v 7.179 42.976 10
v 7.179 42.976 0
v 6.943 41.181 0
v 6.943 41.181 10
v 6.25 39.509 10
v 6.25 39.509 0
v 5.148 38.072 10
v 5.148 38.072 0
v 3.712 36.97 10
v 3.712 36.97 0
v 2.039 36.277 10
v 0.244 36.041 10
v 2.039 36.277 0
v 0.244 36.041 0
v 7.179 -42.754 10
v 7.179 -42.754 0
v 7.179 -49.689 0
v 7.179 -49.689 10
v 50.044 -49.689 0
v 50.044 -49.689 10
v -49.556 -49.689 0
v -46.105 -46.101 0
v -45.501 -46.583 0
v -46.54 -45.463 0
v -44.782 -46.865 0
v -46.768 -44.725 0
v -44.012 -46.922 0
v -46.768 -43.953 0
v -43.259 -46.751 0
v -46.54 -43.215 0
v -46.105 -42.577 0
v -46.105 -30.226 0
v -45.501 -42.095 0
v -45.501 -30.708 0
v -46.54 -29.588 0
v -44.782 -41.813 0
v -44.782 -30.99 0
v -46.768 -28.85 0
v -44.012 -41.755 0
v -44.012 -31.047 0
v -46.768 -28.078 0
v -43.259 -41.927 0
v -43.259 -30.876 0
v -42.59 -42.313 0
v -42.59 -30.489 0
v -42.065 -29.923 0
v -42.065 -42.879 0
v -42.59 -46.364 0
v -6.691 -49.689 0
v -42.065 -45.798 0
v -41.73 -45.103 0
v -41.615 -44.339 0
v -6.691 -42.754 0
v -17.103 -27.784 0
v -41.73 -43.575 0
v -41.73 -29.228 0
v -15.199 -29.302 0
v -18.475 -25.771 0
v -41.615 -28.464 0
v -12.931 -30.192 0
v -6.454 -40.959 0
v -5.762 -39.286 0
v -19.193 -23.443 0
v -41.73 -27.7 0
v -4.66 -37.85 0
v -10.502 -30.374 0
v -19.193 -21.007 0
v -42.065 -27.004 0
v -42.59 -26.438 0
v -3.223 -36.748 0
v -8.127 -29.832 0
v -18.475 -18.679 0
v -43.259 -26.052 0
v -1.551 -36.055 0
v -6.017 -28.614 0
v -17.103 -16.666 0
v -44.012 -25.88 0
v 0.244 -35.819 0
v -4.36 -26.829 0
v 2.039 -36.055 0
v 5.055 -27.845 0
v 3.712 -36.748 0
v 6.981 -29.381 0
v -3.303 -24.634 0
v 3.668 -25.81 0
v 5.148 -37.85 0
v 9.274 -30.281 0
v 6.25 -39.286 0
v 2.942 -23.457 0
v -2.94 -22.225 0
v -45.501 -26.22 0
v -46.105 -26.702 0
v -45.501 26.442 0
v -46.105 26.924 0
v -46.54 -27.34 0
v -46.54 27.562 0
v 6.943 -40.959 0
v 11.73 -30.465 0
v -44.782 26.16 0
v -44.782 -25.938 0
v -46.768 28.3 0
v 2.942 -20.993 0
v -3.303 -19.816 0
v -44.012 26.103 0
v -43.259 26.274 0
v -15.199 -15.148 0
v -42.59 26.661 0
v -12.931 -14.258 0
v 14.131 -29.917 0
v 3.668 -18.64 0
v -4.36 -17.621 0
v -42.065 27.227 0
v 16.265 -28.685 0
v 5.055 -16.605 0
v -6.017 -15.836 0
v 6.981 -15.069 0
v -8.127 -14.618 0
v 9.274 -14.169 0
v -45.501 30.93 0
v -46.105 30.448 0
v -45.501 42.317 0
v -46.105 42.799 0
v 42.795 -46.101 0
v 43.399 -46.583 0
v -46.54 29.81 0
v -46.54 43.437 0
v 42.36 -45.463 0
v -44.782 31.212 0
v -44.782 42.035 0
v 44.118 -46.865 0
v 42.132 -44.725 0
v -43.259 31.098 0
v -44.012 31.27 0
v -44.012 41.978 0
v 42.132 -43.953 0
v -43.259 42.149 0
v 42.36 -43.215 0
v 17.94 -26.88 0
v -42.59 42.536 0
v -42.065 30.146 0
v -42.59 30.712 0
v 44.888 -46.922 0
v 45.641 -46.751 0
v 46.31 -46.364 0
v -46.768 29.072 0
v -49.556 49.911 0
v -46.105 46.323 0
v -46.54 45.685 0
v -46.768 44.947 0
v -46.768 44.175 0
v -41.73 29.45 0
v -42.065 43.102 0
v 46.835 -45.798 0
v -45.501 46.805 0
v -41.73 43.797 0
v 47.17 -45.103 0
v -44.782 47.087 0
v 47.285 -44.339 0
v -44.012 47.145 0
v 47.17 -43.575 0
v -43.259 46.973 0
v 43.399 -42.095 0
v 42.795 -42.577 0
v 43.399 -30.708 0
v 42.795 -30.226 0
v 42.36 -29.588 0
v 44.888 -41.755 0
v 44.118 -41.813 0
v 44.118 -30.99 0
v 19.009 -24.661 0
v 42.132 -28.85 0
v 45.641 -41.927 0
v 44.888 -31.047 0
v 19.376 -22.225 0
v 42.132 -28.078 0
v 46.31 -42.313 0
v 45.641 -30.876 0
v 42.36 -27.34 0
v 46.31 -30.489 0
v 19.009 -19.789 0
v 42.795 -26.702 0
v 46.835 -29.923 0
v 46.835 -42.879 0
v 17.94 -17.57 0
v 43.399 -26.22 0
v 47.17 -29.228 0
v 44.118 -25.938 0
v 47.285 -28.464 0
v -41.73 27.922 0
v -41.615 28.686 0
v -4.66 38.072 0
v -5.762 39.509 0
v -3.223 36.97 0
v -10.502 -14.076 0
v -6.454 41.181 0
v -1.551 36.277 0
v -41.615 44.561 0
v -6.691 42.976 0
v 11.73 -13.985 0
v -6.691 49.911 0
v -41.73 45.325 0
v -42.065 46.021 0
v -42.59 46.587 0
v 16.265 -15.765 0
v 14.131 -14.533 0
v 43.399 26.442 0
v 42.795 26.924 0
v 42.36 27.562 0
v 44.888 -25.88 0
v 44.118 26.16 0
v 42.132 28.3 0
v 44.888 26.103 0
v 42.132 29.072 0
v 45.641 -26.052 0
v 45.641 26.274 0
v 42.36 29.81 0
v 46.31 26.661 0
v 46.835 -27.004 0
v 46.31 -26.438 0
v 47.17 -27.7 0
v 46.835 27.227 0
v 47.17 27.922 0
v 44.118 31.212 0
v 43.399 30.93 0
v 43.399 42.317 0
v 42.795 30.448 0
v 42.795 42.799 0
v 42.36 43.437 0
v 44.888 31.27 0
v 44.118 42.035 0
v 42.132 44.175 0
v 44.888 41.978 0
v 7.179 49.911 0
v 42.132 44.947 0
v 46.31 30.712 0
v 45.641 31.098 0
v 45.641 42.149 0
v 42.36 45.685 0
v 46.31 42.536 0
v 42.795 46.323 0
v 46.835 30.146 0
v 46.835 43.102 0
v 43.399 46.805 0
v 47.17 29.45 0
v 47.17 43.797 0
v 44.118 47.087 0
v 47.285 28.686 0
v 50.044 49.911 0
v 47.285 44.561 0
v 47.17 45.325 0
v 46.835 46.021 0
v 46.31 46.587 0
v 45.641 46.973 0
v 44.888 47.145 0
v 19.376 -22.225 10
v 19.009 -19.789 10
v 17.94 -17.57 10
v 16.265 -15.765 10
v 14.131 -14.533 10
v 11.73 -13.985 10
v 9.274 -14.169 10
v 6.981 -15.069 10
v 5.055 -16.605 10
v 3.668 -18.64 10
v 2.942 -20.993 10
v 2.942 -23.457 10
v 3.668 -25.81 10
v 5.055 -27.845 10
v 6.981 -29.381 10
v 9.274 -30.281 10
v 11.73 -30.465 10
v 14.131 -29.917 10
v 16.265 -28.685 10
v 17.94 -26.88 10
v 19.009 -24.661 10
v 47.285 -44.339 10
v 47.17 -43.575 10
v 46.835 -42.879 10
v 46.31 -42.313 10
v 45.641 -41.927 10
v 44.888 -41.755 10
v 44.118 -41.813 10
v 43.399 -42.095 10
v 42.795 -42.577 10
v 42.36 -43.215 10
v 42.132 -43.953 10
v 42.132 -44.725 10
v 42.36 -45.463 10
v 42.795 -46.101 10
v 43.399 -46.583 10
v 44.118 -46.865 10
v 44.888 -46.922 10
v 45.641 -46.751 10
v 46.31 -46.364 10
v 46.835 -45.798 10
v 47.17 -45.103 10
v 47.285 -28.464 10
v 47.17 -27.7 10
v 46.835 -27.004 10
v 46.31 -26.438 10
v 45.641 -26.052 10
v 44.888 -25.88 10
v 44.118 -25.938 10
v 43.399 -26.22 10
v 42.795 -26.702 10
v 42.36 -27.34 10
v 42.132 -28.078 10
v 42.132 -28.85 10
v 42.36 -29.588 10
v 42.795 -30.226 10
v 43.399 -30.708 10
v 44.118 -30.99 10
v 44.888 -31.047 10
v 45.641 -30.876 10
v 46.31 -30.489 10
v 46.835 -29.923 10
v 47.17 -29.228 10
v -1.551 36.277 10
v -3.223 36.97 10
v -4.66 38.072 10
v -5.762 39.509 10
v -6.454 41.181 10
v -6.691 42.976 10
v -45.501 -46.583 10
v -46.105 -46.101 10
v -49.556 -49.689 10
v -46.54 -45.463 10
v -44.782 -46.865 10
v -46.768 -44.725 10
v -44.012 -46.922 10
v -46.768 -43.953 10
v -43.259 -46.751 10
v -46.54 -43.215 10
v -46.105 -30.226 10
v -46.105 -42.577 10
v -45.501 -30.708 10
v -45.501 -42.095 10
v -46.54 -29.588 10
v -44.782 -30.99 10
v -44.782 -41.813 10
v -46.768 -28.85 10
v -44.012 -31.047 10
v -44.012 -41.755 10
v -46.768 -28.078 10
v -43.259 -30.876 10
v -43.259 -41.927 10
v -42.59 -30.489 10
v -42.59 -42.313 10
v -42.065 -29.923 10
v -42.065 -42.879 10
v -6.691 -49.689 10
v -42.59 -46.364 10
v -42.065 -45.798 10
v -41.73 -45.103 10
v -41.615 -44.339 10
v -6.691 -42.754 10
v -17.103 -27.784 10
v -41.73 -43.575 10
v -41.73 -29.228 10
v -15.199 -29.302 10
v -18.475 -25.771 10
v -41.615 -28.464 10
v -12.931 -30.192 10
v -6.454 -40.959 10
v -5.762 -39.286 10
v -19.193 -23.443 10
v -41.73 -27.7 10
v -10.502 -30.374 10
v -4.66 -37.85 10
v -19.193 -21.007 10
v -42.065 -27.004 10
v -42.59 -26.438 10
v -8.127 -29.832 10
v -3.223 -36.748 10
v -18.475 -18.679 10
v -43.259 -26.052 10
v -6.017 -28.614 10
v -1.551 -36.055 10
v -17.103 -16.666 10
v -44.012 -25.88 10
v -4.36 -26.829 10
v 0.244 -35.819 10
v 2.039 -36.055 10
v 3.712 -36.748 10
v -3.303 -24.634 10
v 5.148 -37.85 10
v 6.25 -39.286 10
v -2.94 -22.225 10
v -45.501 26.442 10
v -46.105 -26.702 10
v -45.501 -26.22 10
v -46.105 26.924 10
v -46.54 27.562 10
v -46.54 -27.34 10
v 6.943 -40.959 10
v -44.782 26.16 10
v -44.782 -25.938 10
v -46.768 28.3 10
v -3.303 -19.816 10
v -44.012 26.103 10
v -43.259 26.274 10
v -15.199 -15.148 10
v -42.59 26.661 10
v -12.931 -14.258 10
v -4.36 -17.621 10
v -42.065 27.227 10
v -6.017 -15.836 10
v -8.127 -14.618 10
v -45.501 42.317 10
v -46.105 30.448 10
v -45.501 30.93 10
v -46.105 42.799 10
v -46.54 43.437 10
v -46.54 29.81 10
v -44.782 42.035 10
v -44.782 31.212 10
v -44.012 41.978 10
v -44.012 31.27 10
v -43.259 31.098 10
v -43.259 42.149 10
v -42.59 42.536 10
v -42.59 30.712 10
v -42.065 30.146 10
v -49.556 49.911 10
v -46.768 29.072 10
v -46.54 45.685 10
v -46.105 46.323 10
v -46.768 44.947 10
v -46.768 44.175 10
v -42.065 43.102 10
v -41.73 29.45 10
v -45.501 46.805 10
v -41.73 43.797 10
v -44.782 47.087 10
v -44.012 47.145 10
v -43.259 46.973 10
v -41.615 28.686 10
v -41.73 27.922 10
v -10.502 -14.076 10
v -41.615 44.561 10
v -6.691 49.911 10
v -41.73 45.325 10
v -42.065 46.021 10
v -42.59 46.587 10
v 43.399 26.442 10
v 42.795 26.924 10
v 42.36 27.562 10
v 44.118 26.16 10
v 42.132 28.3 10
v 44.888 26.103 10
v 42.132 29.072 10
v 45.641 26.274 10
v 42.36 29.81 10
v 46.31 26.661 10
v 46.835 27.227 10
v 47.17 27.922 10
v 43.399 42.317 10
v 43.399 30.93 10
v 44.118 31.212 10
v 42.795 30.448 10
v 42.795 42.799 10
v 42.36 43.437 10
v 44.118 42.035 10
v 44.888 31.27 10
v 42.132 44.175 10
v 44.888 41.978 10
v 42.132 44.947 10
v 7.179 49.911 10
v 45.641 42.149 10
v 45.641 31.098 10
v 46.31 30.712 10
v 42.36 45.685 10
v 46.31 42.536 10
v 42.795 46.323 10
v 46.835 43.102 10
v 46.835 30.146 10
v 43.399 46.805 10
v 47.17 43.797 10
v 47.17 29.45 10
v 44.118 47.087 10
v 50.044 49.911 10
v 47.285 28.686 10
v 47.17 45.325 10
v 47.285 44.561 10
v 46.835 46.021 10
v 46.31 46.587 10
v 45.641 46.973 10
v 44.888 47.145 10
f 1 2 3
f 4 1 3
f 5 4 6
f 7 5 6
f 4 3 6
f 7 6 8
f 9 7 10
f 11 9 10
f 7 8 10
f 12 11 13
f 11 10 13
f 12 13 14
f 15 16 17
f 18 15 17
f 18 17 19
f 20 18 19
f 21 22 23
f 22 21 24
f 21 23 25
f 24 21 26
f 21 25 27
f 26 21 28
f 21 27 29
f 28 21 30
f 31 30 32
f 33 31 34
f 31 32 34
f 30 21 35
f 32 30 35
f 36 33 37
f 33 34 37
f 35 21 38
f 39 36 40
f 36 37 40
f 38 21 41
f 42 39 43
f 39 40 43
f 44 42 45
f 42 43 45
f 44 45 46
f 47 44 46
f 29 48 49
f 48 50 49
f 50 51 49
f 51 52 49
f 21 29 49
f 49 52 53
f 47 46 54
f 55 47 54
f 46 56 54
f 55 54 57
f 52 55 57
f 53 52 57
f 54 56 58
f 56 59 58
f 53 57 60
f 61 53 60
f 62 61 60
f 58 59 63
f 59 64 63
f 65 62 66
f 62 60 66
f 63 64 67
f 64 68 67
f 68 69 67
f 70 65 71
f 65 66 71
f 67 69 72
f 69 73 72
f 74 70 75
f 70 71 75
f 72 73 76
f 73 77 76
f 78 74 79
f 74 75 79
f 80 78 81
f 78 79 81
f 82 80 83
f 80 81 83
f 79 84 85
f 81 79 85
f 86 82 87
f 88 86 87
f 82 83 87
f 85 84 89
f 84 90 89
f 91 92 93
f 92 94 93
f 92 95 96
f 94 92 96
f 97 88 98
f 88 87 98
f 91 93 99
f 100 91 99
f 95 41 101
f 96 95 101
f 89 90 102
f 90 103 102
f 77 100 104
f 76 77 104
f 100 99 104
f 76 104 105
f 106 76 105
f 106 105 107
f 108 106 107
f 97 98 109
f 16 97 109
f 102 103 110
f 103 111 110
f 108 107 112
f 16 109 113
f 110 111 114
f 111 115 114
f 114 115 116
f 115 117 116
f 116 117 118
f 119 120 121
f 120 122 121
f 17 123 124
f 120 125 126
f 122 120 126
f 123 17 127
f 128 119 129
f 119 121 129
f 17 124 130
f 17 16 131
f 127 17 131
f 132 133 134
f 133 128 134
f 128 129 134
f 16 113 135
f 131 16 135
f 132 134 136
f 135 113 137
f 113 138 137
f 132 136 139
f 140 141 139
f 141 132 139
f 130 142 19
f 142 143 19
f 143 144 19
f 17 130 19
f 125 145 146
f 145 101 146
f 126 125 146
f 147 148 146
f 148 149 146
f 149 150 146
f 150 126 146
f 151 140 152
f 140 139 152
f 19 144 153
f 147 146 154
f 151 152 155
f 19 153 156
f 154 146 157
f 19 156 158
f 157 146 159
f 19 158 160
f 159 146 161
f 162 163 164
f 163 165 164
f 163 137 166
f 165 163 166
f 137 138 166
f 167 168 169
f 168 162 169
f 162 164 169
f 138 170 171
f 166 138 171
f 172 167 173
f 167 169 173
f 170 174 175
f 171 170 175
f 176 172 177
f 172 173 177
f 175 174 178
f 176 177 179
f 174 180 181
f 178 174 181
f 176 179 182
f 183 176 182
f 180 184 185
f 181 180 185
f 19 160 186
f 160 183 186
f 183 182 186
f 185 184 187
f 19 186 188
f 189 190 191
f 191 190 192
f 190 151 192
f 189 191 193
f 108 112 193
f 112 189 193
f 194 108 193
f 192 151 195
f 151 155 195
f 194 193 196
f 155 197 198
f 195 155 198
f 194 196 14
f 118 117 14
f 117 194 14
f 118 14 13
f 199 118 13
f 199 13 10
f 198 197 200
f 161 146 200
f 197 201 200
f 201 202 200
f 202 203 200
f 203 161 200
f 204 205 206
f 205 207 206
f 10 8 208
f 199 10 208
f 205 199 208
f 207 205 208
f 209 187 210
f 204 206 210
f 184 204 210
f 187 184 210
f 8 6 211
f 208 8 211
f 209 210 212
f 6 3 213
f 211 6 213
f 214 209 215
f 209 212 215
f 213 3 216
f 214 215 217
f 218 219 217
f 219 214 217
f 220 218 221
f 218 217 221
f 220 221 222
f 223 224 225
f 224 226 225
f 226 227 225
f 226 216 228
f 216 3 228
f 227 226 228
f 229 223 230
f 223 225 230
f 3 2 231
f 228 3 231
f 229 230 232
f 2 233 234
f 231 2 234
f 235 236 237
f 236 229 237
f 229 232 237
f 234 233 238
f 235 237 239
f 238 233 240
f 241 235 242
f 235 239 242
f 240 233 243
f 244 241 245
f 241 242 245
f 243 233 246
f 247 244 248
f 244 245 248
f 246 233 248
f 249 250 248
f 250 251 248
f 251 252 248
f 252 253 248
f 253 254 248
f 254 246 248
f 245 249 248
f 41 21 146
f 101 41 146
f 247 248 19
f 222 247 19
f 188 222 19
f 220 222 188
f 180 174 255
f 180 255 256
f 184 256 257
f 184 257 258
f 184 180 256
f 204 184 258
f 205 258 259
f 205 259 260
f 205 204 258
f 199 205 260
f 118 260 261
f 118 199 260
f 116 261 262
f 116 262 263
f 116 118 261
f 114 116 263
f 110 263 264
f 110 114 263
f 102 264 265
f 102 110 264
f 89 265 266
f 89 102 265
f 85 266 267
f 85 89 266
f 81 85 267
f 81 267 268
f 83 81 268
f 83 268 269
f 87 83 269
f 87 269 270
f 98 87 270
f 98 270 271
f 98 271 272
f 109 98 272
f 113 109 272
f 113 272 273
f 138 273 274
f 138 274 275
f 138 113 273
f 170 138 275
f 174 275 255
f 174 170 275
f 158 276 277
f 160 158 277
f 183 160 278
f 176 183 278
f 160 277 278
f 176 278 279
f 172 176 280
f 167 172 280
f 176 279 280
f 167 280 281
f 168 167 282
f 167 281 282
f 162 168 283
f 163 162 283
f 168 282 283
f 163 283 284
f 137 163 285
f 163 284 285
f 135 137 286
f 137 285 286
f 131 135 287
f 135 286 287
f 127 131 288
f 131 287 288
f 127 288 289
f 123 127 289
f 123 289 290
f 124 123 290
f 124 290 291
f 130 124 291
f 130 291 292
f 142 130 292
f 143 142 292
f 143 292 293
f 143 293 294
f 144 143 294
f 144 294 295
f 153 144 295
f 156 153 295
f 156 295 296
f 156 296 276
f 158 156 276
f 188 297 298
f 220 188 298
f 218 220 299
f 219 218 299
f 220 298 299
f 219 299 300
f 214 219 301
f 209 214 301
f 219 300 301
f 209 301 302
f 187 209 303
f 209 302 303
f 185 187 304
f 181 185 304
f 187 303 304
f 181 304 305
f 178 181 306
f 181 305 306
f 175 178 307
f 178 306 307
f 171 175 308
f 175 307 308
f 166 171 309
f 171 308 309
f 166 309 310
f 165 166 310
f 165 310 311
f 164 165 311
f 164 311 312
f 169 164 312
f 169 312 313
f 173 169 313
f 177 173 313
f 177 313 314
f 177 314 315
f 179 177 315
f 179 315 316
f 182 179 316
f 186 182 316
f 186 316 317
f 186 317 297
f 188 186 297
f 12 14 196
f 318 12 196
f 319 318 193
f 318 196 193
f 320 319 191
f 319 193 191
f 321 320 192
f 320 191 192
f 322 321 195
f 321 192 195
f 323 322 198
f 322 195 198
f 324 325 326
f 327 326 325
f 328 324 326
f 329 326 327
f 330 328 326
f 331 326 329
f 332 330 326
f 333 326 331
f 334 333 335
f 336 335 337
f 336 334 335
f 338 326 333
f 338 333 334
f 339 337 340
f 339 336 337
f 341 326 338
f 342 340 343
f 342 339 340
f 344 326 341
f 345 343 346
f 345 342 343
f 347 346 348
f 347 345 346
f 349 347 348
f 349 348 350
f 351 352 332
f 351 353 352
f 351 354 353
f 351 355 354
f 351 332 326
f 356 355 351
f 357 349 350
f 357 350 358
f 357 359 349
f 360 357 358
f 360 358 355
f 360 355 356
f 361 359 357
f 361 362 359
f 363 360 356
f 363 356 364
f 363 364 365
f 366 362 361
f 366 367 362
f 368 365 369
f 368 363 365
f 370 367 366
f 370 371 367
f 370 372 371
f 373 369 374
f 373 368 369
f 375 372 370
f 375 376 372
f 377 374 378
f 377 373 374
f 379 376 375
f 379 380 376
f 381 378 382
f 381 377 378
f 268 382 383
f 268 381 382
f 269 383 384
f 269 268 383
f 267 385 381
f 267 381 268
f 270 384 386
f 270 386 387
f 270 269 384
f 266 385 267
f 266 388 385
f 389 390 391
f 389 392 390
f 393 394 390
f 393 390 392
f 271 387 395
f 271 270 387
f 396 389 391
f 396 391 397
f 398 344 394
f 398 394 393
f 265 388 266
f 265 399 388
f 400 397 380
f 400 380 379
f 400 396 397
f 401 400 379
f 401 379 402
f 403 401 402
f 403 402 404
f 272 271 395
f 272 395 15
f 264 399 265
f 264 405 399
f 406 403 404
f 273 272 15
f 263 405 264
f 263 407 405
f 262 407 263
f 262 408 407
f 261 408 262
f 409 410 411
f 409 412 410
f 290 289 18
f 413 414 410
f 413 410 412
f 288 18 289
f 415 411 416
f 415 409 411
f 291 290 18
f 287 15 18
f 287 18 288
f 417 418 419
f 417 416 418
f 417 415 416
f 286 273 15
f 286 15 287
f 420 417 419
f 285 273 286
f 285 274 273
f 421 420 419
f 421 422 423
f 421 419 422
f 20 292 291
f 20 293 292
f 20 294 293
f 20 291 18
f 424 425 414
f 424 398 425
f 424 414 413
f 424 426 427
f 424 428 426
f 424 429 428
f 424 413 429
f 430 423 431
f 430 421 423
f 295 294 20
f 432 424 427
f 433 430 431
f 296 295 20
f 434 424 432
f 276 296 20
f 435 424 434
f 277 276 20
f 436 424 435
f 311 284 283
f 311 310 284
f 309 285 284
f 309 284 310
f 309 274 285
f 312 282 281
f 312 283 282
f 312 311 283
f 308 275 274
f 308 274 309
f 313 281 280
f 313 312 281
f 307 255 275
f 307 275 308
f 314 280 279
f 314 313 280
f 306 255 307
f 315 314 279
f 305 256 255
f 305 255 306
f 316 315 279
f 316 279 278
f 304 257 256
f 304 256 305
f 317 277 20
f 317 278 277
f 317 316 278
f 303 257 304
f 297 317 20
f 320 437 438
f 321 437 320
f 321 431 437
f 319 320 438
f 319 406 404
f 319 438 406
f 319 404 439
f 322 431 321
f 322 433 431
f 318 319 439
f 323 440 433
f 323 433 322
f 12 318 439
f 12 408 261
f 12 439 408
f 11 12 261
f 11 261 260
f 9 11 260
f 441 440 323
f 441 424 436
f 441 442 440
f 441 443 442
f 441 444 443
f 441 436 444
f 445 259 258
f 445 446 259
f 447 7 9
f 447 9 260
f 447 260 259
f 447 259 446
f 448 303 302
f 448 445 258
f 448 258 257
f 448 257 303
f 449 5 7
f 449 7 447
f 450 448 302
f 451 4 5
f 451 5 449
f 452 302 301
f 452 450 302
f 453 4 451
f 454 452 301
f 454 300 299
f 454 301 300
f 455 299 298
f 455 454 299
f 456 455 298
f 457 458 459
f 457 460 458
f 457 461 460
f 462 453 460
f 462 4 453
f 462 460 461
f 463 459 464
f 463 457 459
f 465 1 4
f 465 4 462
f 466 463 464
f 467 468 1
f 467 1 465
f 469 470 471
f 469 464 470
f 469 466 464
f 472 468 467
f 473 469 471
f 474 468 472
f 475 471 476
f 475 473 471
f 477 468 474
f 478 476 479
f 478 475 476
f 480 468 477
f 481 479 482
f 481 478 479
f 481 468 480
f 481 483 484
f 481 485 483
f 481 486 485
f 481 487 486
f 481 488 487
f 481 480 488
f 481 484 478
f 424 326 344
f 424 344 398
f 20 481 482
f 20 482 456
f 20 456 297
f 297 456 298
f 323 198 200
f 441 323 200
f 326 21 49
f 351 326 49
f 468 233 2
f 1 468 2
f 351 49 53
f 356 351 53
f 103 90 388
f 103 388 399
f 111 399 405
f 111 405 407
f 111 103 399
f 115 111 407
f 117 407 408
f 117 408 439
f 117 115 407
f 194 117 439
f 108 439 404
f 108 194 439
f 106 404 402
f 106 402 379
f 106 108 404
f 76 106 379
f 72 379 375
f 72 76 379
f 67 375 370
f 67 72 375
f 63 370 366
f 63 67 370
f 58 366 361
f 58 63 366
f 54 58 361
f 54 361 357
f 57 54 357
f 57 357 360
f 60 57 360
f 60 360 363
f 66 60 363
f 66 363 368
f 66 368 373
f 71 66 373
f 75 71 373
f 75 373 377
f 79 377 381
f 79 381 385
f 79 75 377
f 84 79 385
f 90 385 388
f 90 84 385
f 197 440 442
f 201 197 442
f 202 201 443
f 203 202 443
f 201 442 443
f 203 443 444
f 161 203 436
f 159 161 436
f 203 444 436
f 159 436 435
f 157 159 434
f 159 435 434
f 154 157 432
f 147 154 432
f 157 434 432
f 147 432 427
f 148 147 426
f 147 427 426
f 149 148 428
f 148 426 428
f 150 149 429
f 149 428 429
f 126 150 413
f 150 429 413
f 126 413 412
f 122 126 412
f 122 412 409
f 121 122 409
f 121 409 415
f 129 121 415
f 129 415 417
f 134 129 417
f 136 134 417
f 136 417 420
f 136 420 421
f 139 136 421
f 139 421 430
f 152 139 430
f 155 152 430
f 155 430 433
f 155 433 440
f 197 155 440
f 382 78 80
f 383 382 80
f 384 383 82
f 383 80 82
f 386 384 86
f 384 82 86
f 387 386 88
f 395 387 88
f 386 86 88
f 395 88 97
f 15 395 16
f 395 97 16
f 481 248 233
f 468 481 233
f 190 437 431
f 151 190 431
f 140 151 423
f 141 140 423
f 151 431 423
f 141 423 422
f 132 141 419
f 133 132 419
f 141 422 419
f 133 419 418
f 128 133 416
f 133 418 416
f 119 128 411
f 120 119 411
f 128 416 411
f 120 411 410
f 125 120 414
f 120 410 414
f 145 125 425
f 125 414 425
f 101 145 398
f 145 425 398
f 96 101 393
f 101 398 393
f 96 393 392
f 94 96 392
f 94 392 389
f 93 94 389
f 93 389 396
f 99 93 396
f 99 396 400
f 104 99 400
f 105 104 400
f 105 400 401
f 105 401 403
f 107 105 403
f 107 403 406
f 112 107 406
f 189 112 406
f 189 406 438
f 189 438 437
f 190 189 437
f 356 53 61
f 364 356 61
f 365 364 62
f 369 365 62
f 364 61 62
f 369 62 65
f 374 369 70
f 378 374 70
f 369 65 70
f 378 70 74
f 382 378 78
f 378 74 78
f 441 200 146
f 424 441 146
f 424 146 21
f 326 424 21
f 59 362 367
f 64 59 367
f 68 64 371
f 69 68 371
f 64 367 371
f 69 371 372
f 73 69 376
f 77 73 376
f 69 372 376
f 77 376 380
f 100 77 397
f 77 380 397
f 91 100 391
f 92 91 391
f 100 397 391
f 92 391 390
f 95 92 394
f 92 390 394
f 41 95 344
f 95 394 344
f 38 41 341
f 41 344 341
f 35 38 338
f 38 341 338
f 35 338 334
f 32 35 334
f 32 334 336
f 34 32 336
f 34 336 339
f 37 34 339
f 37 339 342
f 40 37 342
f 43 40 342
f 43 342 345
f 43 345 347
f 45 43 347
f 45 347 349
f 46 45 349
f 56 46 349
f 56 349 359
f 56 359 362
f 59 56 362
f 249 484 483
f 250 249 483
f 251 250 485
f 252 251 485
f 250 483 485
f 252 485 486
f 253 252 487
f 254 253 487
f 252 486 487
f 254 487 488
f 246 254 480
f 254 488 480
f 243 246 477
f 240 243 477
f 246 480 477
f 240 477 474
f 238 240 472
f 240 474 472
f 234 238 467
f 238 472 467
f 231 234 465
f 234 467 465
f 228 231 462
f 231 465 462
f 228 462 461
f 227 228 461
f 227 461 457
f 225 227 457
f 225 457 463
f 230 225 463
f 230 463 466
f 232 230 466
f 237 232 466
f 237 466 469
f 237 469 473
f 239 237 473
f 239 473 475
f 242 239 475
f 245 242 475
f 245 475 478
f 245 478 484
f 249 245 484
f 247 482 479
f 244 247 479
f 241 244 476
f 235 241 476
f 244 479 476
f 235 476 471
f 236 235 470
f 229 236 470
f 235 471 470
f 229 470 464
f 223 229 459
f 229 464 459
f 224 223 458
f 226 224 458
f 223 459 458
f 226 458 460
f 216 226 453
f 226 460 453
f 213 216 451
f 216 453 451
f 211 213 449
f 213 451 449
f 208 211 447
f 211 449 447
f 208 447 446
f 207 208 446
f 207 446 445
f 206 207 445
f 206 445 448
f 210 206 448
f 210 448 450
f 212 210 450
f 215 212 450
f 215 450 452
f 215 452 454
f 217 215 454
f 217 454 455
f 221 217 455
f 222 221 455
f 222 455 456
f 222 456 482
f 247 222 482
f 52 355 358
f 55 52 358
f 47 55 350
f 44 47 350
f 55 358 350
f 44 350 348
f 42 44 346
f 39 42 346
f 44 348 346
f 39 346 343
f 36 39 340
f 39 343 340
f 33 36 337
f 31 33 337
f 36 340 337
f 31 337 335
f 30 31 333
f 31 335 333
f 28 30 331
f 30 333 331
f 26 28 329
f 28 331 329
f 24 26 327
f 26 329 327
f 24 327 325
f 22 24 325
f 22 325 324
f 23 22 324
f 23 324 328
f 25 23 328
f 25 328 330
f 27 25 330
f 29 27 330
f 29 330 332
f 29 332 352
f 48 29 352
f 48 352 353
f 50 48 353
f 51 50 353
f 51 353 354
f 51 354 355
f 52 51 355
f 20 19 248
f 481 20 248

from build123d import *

# Parameters (mm, degrees)
SKETCH3_R                  = 8.172257435
SKETCH3_R_2                = 8.263232928
BOSS_EXTRUDE4_DEPTH        = 10
F_6_0_204_DIAMETER_HOLE1_D = 5.1816


with BuildPart() as part:
    # Sketch3 → Boss-Extrude4 (new body)
    # profile 1 of 5: a face of its own
    with BuildSketch(Plane.XY):
        Polygon((-49.555785737, 49.911142193), (-49.555785737, -49.688857807), (-6.690785737, -49.688857807), (-6.690785737, -42.753857807), (-6.690785737, -35.818857807), (0.244214263, -35.818857807), (7.179214263, -35.818857807), (7.179214263, -42.753857807), (7.179214263, -49.688857807), (50.044214263, -49.688857807), (50.044214263, 49.911142193), (7.179214263, 49.911142193), (7.179214263, 42.976142193), (7.179214263, 36.041142193), (0.244214299, 36.041142193), (-6.690785737, 36.041142193), (-6.690785737, 42.976142193), (-6.690785737, 49.911142193), align=None)
        with Locations((-11.1125, -22.225)):
            Circle(SKETCH3_R, mode=Mode.SUBTRACT)
        with Locations((11.1125, -22.225)):
            Circle(SKETCH3_R_2, mode=Mode.SUBTRACT)
    # profile 2 of 5: a face of its own
    with BuildSketch(Plane.XY):
        with BuildLine():
            Line((-6.690785737, -35.818857807), (-6.690785737, -42.753857807))
            ThreePointArc((-6.690785737, -42.753857807), (-4.659571264, -37.85007228), (0.244214263, -35.818857807))
            Line((0.244214263, -35.818857807), (-6.690785737, -35.818857807))
        make_face()
    # profile 3 of 5: a face of its own
    with BuildSketch(Plane.XY):
        with BuildLine():
            ThreePointArc((0.244214263, -35.818857807), (5.147999791, -37.85007228), (7.179214263, -42.753857807))
            Line((7.179214263, -42.753857807), (7.179214263, -35.818857807))
            Line((7.179214263, -35.818857807), (0.244214263, -35.818857807))
        make_face()
    # profile 4 of 5: a face of its own
    with BuildSketch(Plane.XY):
        with BuildLine():
            ThreePointArc((0.244214299, 36.041142193), (-4.659571252, 38.072356653), (-6.690785737, 42.976142193))
            Line((-6.690785737, 42.976142193), (-6.690785737, 36.041142193))
            Line((-6.690785737, 36.041142193), (0.244214299, 36.041142193))
        make_face()
    # profile 5 of 5: a face of its own
    with BuildSketch(Plane.XY):
        with BuildLine():
            Line((7.179214263, 36.041142193), (7.179214263, 42.976142193))
            ThreePointArc((7.179214263, 42.976142193), (5.147999803, 38.072356678), (0.244214299, 36.041142193))
            Line((0.244214299, 36.041142193), (7.179214263, 36.041142193))
        make_face()
    extrude(amount=BOSS_EXTRUDE4_DEPTH)

    # #6 (0.204) Diameter Hole1 (through all)
    with Locations(Plane(origin=(0, 0, 0), x_dir=(-1, 0, 0), z_dir=(0, 0, -1))):
        with Locations((44.205785737, -44.338857807), (-44.694214263, -44.338857807), (-44.694214263, 44.561142193), (44.205785737, 44.561142193), (44.205785737, 28.686142193), (44.205785737, -28.463857807), (-44.694214263, -28.463857807), (-44.694214263, 28.686142193)):
            Hole(F_6_0_204_DIAMETER_HOLE1_D / 2)


solid = part.part
